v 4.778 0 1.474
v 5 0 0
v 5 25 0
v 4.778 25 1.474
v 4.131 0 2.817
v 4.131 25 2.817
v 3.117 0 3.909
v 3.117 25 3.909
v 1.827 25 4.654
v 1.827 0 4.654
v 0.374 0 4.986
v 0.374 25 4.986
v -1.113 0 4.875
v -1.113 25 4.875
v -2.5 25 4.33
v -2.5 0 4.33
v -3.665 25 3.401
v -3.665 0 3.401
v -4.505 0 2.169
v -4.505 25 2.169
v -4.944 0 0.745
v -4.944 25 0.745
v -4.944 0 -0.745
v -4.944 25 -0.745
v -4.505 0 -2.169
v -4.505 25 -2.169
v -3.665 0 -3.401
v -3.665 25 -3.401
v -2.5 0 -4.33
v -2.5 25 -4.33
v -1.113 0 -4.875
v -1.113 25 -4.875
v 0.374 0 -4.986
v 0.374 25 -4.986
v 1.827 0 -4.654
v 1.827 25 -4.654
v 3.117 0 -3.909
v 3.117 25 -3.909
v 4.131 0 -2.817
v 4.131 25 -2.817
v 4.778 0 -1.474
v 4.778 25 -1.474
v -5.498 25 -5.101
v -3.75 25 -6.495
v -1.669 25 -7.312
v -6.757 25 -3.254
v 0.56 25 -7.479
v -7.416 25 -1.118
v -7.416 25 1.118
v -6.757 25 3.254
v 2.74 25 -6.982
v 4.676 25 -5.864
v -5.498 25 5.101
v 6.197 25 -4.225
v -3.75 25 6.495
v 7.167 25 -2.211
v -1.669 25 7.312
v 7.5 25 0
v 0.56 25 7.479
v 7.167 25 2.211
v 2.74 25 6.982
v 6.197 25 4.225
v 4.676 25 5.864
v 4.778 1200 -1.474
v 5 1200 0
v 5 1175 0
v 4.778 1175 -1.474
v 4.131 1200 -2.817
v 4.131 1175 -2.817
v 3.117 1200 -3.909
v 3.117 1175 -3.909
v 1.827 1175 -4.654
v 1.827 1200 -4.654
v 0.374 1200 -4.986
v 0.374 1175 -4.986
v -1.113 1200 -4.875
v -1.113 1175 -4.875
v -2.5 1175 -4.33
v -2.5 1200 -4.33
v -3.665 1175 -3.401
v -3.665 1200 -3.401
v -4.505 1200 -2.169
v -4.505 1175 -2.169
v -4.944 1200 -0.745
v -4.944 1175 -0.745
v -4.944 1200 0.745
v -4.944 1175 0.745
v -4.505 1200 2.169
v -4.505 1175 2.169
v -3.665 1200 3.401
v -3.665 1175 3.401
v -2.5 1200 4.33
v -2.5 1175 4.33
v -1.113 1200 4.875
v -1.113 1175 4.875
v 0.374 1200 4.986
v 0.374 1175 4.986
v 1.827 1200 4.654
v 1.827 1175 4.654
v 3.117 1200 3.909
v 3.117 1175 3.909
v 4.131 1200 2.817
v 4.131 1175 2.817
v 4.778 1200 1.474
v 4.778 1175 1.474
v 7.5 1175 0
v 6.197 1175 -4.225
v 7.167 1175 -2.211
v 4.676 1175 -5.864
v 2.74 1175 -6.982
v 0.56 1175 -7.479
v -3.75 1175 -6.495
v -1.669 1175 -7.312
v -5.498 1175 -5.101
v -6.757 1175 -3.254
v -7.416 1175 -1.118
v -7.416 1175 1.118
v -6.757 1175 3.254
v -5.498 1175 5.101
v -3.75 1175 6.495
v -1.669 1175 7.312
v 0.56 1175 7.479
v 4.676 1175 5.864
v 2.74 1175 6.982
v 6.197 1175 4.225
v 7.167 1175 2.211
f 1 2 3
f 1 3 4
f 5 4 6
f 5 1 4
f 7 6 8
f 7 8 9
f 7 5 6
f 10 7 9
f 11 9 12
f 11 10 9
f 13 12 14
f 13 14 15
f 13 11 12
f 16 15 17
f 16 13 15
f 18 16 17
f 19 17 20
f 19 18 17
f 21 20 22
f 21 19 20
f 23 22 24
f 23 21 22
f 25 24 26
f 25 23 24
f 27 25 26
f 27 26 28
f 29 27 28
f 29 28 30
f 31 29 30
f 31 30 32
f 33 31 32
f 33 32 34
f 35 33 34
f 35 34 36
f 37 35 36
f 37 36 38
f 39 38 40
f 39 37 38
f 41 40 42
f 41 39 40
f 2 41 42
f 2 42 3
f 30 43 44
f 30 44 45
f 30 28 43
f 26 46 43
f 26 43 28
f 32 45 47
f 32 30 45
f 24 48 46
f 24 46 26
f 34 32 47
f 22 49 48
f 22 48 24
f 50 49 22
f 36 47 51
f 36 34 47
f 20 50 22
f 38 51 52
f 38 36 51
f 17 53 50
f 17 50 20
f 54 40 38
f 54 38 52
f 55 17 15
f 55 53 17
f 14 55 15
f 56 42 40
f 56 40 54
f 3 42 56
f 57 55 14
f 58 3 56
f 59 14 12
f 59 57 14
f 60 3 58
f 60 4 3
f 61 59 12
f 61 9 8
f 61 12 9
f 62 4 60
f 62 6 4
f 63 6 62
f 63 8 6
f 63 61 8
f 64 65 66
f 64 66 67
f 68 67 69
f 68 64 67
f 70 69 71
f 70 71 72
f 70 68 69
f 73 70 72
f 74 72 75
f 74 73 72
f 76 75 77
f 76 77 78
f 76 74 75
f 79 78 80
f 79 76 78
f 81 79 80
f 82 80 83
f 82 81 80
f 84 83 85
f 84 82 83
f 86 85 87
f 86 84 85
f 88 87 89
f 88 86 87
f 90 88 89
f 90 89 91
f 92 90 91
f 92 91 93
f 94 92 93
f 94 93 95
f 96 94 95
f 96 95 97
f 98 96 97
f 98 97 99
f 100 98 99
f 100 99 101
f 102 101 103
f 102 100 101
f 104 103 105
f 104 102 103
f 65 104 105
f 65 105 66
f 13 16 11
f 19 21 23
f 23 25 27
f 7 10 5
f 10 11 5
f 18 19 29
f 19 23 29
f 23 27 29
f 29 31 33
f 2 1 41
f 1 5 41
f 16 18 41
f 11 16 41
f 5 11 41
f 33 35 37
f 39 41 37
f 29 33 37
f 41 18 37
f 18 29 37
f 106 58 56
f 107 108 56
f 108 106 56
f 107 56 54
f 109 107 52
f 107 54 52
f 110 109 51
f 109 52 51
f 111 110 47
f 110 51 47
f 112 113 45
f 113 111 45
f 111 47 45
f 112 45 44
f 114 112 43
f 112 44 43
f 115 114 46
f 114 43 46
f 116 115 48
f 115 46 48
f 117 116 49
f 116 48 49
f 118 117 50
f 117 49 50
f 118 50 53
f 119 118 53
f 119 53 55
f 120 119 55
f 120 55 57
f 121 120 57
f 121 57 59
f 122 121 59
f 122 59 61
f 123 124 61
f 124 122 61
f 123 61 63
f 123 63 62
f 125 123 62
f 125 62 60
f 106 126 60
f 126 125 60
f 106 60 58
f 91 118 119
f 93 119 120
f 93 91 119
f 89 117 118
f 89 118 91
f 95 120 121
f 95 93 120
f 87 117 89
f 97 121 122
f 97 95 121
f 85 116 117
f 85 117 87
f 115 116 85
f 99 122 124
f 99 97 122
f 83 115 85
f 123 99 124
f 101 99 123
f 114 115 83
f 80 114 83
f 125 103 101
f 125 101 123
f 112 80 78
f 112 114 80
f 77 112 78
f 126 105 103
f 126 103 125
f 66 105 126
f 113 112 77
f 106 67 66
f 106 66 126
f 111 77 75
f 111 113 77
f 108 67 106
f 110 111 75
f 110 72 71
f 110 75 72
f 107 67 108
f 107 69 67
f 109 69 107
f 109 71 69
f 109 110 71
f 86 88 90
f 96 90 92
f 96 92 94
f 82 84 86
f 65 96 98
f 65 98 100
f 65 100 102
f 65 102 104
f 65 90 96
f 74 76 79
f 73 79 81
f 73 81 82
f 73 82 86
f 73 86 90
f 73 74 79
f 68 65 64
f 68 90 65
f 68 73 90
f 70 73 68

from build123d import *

# Parameters (mm, degrees)
SKETCH1_R           = 7.5
BOSS_EXTRUDE1_DEPTH = 1200
SKETCH2_OUTSIDE_W   = 257.038
SKETCH2_OUTSIDE_H   = 257.038
SKETCH2_OUTSIDE_R   = 5
CUT_EXTRUDE1_DEPTH  = 25
SKETCH3_OUTSIDE_W   = 257.038
SKETCH3_OUTSIDE_H   = 257.038
SKETCH3_OUTSIDE_R   = 5
CUT_EXTRUDE2_DEPTH  = 25


with BuildPart() as part:
    # Sketch1 → Boss-Extrude1 (new body)
    with BuildSketch(Plane(origin=(0, 0, 0), x_dir=(1, 0, 0), z_dir=(0, 1, 0))):
        Circle(SKETCH1_R)
    extrude(amount=BOSS_EXTRUDE1_DEPTH)

    # Sketch2 outside → Cut-Extrude1 (cut)
    with BuildSketch(Plane(origin=(0, 1200, 0), x_dir=(1, 0, 0), z_dir=(0, 1, 0))):
        Rectangle(SKETCH2_OUTSIDE_W, SKETCH2_OUTSIDE_H)
        Circle(SKETCH2_OUTSIDE_R, mode=Mode.SUBTRACT)
    extrude(amount=-CUT_EXTRUDE1_DEPTH, mode=Mode.SUBTRACT)

    # Sketch3 outside → Cut-Extrude2 (cut)
    with BuildSketch(Plane.XZ):
        Rectangle(SKETCH3_OUTSIDE_W, SKETCH3_OUTSIDE_H)
        Circle(SKETCH3_OUTSIDE_R, mode=Mode.SUBTRACT)
    extrude(amount=-CUT_EXTRUDE2_DEPTH, mode=Mode.SUBTRACT)


solid = part.part
